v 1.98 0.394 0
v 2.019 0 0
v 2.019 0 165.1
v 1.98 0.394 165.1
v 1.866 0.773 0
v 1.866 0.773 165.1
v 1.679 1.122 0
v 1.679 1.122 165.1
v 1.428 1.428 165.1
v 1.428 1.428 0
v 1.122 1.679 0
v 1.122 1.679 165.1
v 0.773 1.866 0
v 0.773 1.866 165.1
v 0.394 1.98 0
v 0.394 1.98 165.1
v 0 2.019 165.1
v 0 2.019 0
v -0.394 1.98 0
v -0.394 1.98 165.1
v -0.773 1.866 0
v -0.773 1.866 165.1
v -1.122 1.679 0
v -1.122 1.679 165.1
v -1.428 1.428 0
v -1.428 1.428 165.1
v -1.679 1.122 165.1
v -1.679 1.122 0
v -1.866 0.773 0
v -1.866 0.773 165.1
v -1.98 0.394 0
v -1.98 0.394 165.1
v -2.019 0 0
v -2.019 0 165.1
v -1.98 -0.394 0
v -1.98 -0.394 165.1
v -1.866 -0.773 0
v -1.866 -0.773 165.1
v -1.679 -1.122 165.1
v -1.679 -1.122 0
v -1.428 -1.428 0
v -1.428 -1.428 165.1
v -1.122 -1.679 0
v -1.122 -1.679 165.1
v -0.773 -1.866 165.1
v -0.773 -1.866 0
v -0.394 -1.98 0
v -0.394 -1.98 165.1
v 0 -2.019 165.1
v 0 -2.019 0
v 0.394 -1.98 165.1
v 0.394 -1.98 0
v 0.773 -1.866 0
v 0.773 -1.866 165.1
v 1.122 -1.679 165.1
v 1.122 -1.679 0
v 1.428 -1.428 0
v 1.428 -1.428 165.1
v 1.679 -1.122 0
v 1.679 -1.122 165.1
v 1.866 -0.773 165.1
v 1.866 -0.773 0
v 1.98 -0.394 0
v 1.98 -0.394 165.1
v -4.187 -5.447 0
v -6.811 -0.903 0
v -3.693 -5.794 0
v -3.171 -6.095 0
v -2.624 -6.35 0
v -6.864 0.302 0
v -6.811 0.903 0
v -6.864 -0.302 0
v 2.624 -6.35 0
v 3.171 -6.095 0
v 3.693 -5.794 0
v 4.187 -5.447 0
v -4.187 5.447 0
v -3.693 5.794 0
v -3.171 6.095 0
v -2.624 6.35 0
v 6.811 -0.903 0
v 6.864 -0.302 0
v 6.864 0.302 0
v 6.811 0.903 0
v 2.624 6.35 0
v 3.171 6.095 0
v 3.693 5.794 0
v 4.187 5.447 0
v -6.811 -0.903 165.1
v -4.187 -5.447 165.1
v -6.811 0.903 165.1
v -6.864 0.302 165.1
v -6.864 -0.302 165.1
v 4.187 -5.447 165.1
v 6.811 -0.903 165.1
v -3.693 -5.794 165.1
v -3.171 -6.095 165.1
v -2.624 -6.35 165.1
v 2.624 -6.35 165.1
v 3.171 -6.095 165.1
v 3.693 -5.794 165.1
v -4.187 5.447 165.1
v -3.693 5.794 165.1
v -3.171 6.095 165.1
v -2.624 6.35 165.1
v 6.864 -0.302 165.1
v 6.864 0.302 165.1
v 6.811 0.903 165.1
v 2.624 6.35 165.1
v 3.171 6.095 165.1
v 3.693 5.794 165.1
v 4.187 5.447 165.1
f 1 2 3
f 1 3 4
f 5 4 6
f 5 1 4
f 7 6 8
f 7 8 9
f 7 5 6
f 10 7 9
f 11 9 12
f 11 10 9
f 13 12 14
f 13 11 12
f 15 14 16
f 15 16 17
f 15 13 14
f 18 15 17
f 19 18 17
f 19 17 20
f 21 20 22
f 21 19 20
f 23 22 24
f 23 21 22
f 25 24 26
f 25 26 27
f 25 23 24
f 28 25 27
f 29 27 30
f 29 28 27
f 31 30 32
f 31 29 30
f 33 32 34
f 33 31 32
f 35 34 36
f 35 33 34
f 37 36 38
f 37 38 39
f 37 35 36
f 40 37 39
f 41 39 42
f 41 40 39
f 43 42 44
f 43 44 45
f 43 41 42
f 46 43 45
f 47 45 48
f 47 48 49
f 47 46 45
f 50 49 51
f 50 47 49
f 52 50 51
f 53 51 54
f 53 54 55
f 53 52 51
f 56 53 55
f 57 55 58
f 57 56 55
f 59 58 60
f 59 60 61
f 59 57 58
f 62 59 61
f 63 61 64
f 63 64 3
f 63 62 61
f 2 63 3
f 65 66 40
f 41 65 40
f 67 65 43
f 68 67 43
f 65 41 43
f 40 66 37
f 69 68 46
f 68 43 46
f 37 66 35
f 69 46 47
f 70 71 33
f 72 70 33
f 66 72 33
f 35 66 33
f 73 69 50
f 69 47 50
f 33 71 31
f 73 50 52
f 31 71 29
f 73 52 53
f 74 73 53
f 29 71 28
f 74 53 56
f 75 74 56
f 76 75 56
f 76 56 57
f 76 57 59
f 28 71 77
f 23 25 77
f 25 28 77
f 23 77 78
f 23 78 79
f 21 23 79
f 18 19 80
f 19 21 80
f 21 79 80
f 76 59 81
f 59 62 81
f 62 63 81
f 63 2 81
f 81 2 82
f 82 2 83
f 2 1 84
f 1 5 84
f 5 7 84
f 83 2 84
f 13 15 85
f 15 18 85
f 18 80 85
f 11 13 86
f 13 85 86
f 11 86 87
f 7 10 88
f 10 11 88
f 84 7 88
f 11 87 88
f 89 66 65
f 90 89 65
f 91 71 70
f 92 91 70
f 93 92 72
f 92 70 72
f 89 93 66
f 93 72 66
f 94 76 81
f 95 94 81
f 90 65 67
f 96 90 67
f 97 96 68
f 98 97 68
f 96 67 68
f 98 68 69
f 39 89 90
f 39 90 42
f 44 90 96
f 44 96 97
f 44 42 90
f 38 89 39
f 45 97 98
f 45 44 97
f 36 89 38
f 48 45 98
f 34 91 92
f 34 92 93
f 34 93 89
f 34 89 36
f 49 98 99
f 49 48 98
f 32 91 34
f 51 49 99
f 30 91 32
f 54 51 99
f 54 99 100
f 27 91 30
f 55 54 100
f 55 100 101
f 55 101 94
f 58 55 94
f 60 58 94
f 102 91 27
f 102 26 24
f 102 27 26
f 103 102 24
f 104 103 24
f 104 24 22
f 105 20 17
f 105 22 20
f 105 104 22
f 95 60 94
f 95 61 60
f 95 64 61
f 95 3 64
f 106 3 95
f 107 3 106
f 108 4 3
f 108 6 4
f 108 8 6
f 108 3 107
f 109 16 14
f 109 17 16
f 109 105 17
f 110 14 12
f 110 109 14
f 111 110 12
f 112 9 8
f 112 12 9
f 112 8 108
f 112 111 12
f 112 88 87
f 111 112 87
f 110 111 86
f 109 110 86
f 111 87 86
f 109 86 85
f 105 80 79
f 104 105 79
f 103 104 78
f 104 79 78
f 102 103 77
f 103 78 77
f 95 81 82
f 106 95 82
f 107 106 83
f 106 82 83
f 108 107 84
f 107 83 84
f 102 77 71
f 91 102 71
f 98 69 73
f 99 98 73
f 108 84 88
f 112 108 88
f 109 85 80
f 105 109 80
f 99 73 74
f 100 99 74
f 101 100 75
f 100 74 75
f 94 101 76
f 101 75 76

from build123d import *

# Parameters (mm, degrees)
SKETCH1_R           = 2.0193
BOSS_EXTRUDE1_DEPTH = 165.1


with BuildPart() as part:
    # Sketch1 → Boss-Extrude1 (new body)
    with BuildSketch(Plane.XY):
        with BuildLine():
            ThreePointArc((-2.623741315, 6.35), (-3.43535, 5.950200742), (-4.187390656, 5.447226632))
            Line((-4.187390656, 5.447226632), (-6.811131972, 0.902773368))
            ThreePointArc((-6.811131972, 0.902773368), (-6.8707, 0), (-6.811131972, -0.902773368))
            Line((-6.811131972, -0.902773368), (-4.187390656, -5.447226632))
            ThreePointArc((-4.187390656, -5.447226632), (-3.43535, -5.950200742), (-2.623741315, -6.35))
            Line((-2.623741315, -6.35), (2.623741315, -6.35))
            ThreePointArc((2.623741315, -6.35), (3.43535, -5.950200742), (4.187390656, -5.447226632))
            Line((4.187390656, -5.447226632), (6.811131972, -0.902773368))
            ThreePointArc((6.811131972, -0.902773368), (6.8707, 0), (6.811131972, 0.902773368))
            Line((6.811131972, 0.902773368), (4.187390656, 5.447226632))
            ThreePointArc((4.187390656, 5.447226632), (3.43535, 5.950200742), (2.623741315, 6.35))
            Line((2.623741315, 6.35), (-2.623741315, 6.35))
        make_face()
        Circle(SKETCH1_R, mode=Mode.SUBTRACT)
    extrude(amount=BOSS_EXTRUDE1_DEPTH)


solid = part.part
